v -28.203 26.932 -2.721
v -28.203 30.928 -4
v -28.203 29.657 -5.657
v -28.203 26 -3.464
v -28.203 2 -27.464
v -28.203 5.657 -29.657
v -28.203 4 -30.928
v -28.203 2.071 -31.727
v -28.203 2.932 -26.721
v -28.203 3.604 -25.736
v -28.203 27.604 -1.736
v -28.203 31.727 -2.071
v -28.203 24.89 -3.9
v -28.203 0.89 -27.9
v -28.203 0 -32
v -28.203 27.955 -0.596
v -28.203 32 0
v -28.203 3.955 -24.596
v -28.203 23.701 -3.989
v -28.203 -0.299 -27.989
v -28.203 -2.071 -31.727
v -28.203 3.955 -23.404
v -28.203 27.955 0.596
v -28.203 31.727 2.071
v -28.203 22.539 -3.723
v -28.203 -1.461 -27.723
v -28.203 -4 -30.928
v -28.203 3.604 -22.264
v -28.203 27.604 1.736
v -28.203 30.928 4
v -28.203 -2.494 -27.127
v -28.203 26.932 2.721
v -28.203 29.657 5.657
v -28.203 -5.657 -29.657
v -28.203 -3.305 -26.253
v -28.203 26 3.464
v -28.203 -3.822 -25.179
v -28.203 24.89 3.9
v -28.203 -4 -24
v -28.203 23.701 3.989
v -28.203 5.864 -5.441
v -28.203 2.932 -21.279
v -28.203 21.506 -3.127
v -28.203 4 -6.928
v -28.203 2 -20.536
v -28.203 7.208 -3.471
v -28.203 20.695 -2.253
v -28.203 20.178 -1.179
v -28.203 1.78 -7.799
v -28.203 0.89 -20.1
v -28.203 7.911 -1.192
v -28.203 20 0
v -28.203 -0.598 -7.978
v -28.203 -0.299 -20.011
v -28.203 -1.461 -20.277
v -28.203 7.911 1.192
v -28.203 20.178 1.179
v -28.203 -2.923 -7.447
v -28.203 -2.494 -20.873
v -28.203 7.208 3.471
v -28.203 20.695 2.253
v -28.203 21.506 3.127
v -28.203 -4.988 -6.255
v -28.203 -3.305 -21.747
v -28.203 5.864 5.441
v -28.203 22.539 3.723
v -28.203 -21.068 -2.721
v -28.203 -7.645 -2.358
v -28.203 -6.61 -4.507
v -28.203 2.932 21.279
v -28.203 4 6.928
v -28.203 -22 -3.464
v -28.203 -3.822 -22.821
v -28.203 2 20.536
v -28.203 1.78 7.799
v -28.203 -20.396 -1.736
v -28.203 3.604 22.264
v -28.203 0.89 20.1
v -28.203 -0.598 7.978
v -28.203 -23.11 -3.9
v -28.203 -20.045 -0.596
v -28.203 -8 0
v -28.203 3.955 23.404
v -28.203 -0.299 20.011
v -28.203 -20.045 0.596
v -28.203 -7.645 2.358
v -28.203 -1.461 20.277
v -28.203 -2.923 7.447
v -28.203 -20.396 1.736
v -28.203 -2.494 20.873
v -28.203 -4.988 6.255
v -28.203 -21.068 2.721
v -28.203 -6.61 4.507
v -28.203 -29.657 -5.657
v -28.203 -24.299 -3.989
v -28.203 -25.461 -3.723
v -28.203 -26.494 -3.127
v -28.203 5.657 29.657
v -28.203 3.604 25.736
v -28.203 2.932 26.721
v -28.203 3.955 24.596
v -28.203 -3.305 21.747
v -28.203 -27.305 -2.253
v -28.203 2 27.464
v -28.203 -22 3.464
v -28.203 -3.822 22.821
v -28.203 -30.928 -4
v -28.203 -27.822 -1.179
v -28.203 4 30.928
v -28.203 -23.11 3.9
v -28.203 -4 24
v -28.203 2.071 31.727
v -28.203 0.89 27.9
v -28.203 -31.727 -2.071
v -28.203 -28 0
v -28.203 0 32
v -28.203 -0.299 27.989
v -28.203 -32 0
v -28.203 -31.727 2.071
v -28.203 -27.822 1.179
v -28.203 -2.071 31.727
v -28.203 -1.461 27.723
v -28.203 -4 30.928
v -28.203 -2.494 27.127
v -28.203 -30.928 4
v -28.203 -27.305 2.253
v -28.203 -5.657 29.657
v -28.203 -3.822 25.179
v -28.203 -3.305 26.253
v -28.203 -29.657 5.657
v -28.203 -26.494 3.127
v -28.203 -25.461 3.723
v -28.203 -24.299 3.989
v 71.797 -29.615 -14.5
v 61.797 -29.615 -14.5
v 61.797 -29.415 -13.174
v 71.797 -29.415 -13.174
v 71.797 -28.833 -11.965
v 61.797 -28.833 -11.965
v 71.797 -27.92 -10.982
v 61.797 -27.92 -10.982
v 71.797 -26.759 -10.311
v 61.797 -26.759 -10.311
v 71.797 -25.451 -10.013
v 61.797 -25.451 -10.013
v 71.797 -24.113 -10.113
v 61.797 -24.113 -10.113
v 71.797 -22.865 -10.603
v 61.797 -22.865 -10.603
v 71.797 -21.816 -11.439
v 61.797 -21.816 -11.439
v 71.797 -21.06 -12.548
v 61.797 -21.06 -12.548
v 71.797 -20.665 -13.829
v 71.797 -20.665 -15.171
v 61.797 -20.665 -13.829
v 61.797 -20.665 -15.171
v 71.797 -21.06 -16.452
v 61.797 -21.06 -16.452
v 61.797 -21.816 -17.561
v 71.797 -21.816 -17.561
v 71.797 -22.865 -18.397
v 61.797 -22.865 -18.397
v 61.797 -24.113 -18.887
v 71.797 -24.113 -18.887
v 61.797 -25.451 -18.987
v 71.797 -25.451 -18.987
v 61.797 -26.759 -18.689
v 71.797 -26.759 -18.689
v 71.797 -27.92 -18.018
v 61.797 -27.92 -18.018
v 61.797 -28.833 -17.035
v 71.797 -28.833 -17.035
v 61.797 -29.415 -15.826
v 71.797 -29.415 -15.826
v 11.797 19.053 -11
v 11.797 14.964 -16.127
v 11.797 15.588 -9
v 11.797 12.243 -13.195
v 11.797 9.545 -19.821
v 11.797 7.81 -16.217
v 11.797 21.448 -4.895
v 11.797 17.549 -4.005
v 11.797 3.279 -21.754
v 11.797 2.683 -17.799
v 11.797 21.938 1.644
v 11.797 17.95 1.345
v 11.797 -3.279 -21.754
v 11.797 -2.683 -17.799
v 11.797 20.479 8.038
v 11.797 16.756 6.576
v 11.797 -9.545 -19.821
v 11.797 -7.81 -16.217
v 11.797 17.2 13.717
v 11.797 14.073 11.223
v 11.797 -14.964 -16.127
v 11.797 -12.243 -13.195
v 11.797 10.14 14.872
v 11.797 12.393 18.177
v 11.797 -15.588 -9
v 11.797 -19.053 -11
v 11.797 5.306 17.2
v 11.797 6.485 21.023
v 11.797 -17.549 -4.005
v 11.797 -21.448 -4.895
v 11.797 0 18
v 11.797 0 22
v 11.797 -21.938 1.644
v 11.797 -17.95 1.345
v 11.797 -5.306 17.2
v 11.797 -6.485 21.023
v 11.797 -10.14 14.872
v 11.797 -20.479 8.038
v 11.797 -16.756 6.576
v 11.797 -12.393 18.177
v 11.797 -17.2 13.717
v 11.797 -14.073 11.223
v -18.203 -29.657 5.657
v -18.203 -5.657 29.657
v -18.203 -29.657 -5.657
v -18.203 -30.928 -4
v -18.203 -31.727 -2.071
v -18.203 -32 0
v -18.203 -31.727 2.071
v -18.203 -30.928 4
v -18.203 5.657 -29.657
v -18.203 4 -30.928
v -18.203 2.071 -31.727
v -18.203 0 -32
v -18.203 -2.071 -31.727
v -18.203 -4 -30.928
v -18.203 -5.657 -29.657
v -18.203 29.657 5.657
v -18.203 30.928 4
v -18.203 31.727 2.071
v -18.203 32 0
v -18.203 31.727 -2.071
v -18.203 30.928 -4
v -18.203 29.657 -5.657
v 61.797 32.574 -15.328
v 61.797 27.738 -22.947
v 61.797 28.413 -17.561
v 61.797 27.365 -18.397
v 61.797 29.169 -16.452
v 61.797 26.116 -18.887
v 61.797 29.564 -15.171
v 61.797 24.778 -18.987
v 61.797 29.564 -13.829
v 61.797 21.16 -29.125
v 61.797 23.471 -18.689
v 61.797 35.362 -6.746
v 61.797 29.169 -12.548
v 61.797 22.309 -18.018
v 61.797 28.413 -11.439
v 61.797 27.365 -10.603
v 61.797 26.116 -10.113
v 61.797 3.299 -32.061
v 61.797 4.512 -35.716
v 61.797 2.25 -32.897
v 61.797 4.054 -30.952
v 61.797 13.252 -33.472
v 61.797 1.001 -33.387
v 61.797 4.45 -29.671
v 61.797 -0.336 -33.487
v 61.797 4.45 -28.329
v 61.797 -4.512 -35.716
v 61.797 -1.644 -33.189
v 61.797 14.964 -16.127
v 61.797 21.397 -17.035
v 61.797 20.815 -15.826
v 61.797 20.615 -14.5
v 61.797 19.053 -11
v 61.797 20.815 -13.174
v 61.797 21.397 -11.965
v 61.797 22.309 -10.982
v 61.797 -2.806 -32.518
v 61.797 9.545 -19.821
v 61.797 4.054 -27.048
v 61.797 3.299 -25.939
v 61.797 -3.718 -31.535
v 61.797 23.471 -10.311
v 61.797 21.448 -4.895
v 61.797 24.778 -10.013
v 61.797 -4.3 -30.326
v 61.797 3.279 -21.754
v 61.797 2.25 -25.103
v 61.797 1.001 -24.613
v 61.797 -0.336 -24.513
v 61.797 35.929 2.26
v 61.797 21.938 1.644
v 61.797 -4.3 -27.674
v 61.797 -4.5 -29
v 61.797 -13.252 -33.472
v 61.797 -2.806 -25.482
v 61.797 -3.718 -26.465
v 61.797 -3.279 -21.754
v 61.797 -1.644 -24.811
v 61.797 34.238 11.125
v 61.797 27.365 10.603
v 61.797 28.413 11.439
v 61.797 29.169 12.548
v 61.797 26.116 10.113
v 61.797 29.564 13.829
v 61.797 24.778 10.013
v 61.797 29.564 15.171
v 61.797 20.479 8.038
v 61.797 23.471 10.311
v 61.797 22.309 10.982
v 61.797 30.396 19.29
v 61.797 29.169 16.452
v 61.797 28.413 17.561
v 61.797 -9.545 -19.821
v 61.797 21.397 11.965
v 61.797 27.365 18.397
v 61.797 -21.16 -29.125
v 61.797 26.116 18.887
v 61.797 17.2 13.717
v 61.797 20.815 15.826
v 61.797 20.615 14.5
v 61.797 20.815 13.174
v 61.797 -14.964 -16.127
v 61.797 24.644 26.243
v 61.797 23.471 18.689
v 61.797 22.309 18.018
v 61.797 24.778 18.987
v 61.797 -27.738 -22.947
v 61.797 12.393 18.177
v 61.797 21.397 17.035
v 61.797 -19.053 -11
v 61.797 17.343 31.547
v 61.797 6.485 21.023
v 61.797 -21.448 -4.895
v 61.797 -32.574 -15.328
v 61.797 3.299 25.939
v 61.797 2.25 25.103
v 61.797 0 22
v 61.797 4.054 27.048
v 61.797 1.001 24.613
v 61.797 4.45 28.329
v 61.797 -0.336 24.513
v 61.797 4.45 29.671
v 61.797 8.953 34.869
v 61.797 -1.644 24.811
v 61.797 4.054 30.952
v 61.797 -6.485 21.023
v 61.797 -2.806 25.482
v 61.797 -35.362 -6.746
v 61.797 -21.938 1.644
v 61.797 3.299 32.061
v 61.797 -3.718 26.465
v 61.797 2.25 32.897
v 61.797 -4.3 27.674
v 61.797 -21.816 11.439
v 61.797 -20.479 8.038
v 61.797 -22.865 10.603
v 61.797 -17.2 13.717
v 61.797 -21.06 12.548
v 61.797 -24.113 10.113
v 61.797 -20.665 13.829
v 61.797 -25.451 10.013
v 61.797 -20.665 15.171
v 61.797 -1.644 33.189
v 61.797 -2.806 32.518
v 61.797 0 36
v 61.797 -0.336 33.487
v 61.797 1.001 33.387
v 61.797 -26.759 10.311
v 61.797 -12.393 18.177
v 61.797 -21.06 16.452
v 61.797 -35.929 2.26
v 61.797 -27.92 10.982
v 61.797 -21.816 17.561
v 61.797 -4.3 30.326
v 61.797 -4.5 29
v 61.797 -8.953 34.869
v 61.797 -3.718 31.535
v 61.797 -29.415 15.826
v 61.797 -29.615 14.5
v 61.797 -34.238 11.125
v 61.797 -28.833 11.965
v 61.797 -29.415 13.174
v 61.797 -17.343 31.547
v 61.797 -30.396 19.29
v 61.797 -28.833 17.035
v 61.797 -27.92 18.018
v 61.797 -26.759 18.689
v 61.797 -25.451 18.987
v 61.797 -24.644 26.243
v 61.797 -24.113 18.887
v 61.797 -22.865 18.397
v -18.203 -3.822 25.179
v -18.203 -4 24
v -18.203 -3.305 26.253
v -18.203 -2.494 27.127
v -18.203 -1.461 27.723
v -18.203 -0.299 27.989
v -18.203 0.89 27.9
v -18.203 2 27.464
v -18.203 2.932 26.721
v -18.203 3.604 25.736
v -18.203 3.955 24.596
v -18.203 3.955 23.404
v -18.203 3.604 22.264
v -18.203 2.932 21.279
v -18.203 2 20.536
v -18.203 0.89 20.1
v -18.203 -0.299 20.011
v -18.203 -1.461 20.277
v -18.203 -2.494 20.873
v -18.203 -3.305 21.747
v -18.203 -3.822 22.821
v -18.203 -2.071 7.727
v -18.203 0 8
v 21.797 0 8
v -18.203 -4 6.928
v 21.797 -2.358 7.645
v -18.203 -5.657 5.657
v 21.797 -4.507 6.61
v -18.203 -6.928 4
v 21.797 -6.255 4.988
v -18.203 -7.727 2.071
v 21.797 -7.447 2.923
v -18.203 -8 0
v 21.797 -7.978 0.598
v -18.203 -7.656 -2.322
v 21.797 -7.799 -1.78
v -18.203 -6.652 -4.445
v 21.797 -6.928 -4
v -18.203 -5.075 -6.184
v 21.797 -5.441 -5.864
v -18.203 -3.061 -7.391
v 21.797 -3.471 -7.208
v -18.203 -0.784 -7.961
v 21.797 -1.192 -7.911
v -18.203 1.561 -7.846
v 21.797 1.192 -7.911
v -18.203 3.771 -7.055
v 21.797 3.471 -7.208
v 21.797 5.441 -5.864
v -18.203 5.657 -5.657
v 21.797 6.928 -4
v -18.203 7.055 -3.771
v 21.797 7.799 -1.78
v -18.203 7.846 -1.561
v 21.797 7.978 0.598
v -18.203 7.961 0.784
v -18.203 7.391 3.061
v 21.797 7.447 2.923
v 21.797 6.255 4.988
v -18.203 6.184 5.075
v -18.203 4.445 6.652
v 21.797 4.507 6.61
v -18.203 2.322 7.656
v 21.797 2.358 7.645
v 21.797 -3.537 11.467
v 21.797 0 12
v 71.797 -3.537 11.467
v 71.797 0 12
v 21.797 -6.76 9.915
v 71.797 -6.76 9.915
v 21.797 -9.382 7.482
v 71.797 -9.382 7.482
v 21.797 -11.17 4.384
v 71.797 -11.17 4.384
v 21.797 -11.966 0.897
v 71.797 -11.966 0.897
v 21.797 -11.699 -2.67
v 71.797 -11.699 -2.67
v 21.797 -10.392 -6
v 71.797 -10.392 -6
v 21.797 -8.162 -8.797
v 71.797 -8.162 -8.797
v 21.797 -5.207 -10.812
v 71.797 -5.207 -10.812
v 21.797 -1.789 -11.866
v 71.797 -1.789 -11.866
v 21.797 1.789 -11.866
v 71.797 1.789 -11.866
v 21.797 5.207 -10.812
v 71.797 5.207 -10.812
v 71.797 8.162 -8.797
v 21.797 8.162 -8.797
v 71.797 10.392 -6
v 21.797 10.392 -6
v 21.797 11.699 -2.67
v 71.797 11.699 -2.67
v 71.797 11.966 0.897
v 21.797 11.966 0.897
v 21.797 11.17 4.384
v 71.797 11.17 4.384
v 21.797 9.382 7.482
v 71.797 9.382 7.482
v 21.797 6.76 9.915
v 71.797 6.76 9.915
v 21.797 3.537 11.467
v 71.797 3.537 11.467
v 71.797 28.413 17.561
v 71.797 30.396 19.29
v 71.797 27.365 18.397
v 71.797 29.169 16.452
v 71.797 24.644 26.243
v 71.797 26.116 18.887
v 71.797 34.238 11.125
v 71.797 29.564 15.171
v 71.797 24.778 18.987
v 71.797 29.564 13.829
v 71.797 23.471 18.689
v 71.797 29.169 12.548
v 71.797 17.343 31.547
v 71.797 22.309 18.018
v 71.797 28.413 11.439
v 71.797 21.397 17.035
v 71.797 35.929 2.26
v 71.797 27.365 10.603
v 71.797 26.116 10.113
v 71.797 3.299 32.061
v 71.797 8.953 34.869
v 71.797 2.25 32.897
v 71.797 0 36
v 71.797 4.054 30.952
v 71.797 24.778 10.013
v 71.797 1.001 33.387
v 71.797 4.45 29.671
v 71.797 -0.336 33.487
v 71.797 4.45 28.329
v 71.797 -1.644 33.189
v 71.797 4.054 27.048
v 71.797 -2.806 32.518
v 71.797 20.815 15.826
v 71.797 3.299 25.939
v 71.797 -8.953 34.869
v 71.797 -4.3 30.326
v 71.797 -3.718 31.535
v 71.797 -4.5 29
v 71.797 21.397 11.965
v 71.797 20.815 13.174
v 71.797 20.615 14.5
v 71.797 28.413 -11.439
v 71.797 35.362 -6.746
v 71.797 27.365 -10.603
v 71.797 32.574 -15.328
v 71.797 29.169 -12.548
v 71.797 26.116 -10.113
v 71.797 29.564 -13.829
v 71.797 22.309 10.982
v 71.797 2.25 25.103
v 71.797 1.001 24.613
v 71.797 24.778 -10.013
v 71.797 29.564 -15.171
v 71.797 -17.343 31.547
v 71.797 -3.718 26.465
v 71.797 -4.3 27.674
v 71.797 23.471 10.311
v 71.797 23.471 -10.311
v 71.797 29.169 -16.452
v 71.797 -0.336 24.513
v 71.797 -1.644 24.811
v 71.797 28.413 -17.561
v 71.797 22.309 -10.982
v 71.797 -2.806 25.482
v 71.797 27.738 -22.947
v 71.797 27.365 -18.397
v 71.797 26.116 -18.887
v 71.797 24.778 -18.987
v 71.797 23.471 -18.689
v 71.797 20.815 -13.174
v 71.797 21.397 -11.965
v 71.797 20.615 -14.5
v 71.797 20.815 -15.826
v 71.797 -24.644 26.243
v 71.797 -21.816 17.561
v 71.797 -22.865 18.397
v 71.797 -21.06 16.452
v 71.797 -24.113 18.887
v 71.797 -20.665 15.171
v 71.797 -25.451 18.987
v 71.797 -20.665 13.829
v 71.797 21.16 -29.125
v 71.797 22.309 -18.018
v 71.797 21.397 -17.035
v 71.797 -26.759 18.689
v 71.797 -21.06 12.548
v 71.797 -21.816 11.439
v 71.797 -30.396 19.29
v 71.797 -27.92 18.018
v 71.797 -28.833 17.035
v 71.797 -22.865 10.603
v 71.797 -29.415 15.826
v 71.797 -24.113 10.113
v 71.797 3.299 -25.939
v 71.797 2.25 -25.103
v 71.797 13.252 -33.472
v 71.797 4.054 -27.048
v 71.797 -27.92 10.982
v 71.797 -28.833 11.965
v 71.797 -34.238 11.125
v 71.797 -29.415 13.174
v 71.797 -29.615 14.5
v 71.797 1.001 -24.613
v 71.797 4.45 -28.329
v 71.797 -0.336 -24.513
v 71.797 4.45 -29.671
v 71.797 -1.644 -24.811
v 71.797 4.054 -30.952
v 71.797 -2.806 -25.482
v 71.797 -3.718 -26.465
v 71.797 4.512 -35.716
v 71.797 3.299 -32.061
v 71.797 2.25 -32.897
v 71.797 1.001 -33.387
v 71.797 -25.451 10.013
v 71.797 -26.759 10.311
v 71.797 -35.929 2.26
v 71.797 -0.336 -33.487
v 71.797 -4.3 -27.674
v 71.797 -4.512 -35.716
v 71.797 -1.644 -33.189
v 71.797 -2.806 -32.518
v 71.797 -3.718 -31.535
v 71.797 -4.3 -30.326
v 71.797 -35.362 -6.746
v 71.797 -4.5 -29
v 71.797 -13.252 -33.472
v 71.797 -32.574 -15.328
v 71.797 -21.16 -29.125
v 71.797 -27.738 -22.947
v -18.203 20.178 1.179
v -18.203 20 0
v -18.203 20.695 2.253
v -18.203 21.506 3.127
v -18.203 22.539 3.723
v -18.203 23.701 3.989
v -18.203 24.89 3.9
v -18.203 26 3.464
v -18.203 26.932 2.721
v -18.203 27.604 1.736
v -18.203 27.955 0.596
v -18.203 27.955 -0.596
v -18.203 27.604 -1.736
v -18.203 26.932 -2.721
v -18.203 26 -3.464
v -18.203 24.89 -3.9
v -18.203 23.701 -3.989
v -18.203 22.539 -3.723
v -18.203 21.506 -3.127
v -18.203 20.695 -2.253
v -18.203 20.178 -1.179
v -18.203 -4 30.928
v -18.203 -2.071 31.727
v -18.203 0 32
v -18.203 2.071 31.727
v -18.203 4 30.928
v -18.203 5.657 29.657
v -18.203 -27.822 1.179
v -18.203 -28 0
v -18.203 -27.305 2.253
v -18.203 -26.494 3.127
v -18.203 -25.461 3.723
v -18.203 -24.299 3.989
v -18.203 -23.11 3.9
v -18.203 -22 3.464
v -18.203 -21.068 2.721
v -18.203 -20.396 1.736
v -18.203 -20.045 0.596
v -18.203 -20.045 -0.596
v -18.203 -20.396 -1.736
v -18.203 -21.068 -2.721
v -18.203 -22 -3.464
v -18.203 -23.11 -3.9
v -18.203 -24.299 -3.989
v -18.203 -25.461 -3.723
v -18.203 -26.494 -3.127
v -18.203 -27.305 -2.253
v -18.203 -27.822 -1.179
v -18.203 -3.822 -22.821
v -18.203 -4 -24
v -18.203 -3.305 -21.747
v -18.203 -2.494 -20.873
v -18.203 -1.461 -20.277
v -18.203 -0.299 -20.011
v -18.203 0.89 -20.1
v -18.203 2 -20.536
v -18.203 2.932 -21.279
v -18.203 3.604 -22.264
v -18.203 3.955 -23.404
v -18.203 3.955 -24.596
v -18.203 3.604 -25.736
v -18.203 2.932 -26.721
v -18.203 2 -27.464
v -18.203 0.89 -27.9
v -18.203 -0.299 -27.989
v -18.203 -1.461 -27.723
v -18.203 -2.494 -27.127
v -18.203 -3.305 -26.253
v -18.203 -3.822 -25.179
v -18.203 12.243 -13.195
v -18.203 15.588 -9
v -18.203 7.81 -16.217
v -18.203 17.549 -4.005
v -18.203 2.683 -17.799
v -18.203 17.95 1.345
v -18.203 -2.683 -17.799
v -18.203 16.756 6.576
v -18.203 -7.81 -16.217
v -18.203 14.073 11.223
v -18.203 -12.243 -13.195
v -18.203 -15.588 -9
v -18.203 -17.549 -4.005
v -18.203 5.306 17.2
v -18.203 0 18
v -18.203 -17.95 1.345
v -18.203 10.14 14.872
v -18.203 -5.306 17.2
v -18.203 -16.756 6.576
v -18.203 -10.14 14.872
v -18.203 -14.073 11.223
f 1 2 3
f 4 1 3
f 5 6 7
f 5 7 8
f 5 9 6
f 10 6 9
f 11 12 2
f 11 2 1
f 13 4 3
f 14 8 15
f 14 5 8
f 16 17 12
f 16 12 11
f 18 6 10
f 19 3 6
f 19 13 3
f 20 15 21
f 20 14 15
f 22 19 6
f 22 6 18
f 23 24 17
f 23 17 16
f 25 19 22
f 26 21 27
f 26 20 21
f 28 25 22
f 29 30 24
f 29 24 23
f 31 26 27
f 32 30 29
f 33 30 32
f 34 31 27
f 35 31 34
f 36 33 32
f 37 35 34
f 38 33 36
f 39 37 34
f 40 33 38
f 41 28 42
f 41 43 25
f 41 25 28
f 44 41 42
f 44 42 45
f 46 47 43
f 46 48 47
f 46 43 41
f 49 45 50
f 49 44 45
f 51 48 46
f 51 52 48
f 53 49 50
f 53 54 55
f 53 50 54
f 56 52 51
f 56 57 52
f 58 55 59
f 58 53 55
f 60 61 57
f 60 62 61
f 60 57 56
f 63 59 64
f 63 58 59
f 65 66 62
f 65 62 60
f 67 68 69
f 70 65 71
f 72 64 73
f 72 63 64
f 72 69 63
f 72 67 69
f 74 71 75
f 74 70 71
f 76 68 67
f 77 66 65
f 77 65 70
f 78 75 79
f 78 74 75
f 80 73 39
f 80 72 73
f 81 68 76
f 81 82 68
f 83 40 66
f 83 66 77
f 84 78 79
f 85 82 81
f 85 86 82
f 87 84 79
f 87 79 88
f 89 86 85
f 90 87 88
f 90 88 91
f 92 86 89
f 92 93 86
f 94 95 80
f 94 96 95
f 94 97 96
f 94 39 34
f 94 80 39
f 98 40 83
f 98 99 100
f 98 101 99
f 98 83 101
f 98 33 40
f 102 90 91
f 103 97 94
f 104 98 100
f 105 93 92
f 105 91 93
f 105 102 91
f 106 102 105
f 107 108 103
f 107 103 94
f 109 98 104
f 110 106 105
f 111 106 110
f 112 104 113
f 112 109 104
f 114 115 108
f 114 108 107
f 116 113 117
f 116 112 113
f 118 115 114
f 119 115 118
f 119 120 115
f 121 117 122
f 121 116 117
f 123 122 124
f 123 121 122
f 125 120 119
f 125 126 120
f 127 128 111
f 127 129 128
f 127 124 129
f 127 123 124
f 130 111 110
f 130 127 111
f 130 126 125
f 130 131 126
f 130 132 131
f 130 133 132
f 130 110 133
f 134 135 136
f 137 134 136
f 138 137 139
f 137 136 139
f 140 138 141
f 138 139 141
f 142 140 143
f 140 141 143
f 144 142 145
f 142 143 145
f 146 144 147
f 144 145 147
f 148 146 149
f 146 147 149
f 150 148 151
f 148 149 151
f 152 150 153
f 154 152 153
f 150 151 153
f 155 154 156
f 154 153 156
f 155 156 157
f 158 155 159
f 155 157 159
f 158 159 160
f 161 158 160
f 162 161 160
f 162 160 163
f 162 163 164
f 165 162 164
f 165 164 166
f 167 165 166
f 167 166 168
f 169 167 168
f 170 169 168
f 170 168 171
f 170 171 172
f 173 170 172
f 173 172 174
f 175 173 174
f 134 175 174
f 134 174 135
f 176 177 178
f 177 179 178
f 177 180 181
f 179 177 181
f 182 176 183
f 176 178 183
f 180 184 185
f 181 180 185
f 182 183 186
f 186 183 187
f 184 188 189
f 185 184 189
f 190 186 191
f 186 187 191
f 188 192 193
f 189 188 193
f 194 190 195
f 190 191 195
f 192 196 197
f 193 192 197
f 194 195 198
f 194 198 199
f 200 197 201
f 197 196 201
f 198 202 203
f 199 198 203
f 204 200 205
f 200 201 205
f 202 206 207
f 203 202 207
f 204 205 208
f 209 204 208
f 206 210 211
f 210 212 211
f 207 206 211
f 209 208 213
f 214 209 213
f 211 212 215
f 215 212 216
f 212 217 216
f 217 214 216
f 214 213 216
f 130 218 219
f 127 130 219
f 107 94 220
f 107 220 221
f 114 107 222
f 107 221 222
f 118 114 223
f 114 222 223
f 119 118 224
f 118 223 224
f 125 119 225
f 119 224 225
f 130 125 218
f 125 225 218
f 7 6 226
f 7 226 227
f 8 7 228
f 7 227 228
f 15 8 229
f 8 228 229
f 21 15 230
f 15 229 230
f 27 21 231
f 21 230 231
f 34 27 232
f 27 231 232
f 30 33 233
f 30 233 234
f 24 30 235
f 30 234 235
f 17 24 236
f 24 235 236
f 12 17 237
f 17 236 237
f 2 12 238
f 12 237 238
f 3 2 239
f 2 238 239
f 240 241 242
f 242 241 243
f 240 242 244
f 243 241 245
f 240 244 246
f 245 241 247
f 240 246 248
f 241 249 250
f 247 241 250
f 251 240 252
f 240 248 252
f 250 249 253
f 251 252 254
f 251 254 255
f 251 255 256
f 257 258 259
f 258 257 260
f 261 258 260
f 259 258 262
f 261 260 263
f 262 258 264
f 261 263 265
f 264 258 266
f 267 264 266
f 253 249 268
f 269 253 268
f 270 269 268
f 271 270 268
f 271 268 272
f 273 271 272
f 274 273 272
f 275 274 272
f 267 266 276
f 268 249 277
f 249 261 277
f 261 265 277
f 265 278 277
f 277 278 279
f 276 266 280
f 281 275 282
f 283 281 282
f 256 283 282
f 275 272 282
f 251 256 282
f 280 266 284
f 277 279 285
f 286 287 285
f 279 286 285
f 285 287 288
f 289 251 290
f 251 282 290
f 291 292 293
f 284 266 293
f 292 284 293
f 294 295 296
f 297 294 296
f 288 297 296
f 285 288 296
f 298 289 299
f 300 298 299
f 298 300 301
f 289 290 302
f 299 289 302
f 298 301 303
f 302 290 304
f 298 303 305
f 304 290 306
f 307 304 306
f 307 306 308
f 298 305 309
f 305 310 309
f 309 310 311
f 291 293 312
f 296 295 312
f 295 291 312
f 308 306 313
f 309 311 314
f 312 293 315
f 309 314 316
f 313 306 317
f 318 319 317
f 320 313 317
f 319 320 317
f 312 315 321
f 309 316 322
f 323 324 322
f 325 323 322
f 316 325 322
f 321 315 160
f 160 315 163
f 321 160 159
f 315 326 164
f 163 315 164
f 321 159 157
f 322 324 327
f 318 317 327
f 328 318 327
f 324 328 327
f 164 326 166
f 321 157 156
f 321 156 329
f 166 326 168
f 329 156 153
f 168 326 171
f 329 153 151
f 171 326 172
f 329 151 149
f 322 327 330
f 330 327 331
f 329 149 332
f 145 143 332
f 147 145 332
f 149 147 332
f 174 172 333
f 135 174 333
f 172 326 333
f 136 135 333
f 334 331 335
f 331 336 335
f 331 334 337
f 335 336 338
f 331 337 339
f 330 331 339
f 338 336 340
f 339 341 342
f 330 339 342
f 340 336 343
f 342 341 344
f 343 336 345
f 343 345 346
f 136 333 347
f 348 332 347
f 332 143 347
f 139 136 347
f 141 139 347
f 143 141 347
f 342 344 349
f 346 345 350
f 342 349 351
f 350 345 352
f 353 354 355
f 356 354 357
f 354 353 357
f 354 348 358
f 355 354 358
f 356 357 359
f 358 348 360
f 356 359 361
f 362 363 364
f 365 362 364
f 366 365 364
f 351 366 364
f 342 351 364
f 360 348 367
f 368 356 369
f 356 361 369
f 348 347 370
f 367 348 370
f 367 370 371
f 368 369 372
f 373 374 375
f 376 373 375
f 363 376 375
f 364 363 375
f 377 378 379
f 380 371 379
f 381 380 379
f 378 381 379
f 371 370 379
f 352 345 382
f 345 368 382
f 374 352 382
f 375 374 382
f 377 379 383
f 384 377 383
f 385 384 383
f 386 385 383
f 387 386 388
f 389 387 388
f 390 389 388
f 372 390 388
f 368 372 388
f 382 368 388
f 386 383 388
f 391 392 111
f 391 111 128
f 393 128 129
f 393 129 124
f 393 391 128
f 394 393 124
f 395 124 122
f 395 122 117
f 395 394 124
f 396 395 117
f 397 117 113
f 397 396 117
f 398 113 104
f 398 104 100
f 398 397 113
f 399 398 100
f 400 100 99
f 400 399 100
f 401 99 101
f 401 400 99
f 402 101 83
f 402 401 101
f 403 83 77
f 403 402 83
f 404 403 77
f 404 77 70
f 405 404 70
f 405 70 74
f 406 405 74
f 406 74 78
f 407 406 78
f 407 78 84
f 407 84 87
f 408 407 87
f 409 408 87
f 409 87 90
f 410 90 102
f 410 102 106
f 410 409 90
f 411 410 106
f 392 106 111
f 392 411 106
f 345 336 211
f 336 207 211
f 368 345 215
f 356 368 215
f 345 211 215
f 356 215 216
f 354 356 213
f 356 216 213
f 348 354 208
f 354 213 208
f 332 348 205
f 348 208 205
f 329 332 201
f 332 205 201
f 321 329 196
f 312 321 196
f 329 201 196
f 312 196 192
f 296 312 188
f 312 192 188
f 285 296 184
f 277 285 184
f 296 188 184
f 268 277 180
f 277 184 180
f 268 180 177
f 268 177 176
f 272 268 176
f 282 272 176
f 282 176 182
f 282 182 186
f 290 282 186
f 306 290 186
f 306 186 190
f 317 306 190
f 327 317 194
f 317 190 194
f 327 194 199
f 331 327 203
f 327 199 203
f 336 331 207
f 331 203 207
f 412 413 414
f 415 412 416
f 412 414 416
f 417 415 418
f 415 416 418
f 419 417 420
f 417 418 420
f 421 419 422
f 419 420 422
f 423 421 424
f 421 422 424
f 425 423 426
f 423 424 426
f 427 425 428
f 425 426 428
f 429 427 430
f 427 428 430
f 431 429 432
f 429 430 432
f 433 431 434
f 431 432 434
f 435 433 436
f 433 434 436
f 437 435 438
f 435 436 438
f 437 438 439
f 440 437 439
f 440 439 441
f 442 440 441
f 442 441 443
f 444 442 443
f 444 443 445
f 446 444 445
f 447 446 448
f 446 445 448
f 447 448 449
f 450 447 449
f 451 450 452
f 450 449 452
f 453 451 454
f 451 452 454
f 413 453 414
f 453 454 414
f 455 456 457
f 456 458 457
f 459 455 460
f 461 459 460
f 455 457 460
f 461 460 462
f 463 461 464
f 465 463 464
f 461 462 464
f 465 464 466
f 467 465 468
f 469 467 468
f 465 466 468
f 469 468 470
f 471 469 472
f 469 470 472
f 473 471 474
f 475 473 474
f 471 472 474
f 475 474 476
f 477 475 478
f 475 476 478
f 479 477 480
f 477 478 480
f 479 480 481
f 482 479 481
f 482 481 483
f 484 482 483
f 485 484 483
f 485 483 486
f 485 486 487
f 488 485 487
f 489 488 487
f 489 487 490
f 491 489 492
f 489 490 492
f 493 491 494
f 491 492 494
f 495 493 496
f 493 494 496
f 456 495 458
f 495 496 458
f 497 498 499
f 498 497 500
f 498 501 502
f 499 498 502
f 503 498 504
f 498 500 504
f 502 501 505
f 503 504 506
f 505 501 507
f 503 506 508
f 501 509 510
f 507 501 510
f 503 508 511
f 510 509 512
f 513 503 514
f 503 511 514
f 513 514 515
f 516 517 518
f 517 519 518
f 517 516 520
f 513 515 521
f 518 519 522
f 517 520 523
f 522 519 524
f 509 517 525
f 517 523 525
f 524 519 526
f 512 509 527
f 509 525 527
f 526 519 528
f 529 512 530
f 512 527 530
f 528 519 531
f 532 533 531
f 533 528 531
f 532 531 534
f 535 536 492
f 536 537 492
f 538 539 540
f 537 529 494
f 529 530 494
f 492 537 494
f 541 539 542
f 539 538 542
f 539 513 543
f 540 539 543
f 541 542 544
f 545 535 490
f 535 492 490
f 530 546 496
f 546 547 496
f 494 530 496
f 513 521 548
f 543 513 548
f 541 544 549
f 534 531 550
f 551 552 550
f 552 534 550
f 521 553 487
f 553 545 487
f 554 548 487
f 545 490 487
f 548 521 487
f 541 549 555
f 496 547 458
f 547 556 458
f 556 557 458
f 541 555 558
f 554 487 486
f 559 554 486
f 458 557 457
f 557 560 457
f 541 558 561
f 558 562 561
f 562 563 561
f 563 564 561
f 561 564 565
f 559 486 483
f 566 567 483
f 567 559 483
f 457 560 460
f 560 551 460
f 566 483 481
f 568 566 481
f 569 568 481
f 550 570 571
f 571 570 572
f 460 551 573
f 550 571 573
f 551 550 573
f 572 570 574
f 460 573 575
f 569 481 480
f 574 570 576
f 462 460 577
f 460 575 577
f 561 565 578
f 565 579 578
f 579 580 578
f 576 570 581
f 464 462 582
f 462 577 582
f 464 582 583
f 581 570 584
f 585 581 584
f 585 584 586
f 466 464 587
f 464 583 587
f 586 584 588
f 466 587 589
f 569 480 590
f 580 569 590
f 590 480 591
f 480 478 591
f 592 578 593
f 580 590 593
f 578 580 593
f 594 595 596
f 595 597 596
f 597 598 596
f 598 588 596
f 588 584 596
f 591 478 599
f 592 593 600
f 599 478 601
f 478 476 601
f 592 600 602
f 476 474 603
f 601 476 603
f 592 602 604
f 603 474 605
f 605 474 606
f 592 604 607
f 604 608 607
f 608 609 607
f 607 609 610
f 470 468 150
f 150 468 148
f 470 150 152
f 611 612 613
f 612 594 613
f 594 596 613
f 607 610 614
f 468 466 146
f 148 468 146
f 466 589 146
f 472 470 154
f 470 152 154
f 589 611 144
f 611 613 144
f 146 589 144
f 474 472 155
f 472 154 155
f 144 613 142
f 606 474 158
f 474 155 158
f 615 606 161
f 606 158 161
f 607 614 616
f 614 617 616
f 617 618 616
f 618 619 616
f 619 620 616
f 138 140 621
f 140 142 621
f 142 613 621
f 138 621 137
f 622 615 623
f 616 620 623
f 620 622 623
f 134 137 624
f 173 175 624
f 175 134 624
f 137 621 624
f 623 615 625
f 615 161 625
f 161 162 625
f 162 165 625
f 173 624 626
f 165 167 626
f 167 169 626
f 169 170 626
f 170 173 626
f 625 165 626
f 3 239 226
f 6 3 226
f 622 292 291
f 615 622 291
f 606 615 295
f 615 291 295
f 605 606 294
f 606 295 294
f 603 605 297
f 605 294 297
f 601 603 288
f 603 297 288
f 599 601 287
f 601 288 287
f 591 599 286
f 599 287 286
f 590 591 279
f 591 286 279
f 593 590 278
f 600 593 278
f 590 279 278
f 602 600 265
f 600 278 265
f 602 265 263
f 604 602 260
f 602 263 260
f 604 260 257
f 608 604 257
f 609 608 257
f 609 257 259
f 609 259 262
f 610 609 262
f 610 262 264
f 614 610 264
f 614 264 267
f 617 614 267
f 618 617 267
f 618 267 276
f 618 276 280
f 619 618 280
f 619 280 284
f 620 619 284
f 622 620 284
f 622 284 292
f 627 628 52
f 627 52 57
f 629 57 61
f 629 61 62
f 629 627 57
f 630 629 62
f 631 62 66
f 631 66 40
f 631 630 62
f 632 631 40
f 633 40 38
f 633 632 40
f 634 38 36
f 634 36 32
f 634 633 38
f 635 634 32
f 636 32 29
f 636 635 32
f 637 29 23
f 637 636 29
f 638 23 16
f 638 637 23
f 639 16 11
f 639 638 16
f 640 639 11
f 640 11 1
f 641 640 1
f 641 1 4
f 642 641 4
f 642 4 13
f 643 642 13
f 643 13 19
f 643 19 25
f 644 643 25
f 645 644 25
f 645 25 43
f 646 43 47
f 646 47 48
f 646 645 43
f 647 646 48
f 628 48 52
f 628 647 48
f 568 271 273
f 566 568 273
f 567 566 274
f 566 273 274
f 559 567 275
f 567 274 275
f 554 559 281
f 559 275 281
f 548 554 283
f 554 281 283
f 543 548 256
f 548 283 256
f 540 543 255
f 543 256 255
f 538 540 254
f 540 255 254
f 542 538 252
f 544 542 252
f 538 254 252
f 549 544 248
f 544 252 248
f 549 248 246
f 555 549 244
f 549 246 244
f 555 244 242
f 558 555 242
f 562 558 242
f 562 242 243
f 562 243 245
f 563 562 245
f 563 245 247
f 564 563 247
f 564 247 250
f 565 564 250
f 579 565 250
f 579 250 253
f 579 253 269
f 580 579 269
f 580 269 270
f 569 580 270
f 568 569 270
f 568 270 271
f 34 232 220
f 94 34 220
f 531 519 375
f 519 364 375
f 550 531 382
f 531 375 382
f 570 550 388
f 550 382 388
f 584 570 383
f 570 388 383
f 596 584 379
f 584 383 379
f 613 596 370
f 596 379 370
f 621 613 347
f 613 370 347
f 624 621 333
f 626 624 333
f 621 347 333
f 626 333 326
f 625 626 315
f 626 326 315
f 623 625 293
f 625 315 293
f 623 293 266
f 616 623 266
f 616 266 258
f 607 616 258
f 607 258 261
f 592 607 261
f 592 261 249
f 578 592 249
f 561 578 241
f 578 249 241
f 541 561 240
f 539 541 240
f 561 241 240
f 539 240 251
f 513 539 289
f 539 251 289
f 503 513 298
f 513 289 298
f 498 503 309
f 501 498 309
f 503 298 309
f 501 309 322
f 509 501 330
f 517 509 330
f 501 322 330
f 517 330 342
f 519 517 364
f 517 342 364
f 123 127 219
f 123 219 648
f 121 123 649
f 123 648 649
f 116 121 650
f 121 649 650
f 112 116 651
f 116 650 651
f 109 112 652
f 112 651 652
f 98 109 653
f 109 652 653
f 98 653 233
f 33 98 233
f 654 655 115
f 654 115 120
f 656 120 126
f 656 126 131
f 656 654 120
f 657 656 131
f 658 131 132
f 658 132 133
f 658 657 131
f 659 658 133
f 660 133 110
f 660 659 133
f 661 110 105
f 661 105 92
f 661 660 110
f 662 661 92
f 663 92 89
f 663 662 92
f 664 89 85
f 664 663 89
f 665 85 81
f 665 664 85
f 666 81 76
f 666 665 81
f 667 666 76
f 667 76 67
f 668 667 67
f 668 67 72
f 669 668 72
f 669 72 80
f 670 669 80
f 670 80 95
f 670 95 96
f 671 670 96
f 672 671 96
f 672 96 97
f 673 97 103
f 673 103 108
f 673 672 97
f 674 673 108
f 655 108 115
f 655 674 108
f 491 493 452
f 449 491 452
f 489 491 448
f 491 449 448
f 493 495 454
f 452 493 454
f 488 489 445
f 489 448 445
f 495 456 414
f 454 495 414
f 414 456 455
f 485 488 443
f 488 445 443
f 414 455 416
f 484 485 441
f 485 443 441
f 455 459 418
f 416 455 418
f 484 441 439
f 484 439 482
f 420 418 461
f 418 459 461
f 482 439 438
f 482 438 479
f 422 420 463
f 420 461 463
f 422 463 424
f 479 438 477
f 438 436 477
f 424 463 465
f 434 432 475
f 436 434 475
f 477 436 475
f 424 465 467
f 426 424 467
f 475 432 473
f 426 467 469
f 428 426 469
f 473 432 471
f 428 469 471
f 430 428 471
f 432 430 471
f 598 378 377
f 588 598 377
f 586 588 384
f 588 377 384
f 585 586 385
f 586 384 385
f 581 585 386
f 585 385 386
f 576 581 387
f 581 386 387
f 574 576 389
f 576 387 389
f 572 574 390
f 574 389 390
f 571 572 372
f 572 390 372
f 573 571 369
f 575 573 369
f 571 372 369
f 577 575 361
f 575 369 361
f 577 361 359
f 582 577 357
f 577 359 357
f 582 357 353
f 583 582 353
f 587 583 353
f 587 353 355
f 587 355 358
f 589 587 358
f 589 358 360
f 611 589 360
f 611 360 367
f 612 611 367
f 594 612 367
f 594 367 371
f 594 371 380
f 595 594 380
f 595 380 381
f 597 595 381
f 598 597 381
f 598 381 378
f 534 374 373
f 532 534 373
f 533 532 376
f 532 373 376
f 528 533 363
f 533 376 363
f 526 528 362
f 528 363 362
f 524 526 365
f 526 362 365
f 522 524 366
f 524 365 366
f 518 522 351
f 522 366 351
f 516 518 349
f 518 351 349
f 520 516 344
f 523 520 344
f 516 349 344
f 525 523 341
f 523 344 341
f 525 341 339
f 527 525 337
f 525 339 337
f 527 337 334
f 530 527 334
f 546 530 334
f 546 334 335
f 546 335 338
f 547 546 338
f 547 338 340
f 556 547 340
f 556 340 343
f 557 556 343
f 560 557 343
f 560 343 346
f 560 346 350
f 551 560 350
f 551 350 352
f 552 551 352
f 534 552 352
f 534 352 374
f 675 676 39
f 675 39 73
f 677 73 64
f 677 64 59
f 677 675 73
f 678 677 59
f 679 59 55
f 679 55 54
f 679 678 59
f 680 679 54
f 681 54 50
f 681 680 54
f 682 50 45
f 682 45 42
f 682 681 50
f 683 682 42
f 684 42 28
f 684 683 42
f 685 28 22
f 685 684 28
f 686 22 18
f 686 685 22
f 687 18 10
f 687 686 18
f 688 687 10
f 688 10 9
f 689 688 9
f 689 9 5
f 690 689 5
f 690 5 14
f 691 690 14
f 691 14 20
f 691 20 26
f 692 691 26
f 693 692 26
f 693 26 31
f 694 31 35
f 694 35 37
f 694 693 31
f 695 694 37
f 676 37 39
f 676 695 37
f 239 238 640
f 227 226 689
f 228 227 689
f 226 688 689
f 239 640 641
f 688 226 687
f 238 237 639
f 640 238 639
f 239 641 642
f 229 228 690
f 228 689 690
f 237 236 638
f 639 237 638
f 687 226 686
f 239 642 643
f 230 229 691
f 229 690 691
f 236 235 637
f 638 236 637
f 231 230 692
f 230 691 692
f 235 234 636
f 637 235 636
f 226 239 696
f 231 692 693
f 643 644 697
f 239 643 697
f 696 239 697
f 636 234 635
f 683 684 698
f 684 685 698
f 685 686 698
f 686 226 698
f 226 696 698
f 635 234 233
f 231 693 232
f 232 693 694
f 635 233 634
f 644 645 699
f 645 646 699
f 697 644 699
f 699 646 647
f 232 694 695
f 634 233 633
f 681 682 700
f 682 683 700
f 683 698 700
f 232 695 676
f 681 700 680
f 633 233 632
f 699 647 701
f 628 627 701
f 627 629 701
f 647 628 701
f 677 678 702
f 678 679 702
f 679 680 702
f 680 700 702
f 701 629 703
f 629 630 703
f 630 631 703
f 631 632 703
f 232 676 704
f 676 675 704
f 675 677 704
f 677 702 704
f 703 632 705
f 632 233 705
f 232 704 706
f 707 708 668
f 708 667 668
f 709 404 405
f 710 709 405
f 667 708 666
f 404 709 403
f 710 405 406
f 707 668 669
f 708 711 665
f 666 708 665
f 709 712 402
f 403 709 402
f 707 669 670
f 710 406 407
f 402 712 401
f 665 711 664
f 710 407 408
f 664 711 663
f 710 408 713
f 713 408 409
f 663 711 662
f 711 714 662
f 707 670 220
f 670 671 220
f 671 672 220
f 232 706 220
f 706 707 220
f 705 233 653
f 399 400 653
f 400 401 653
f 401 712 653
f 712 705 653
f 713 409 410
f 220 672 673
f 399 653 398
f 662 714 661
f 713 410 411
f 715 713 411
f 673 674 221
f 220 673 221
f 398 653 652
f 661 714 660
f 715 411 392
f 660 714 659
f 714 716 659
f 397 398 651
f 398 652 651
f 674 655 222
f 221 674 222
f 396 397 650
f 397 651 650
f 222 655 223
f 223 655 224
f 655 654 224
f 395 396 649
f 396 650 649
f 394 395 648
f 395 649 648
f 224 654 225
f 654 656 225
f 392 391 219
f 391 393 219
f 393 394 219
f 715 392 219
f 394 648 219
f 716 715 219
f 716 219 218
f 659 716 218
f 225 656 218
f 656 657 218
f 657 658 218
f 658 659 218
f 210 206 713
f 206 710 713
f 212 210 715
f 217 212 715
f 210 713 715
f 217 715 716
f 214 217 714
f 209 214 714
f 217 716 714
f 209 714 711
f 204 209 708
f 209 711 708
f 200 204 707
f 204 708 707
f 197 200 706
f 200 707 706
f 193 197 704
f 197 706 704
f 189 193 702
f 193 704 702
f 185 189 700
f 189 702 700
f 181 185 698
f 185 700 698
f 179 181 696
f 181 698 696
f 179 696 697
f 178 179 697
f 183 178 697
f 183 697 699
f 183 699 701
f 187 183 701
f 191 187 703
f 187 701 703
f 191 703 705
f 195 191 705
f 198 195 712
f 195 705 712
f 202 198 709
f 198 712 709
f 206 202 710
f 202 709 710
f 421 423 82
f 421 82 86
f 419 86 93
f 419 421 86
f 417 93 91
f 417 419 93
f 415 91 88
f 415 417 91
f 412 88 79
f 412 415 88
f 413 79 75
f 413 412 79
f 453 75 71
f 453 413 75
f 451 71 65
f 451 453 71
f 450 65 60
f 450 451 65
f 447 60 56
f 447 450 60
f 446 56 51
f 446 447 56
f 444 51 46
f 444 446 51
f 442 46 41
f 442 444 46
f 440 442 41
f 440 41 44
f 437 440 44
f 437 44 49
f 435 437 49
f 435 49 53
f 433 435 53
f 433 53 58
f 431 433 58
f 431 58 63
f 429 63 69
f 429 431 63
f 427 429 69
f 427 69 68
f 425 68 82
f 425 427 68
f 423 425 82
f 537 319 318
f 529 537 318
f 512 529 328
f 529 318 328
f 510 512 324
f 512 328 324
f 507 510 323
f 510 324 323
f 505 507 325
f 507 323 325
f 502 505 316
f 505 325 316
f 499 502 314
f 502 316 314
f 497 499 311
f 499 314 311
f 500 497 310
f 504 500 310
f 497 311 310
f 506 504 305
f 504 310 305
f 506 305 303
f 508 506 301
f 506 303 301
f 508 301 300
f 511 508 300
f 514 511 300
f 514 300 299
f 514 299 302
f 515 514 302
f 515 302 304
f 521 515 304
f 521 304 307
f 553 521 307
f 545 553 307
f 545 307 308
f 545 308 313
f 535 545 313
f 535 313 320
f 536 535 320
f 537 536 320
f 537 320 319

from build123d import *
from build123d import SkipClean  # not in build123d's __all__

# Parameters (mm, degrees)
F2_R     = 4.5
F3_DEPTH = 10.001
F4_R     = 4
F4_R_2   = 18
F4_R_3   = 8
F5_DEPTH = 10


with BuildPart() as f1:
    # F0 (on Front) → F1 (revolve)
    with BuildSketch(Plane.XZ):
        Polygon((-18.203094868, 18), (-18.203094868, 8), (21.796905132, 8), (21.796905132, 12), (71.796905132, 12), (71.796905132, 36), (61.796905132, 36), (61.796905132, 22), (11.796905132, 22), (11.796905132, 18), align=None)
    revolve(axis=Axis((24.6733184904, 0, 0), (1, 0, 0)))

    # F2 (on face) → F3 (cut, through all)
    with BuildSketch(Plane(origin=(61.796905132, 0, 0), x_dir=(0, -1, 0), z_dir=(-1, 0, 0))):
        with Locations((0, 29)):
            Circle(F2_R)
        with Locations((-25.1147367097, 14.5)):
            Circle(F2_R)
        with Locations((-25.1147367097, -14.5)):
            Circle(F2_R)
        with Locations((0, -29)):
            Circle(F2_R)
        with Locations((25.1147367097, -14.5)):
            Circle(F2_R)
        with Locations((25.1147367097, 14.5)):
            Circle(F2_R)
    extrude(amount=-F3_DEPTH, mode=Mode.SUBTRACT)

    # F4 (on face) → F5 (join)
    with BuildSketch(Plane(origin=(-18.203094868, 0, 0), x_dir=(0, -1, 0), z_dir=(-1, 0, 0))):
        with BuildLine():
            ThreePointArc((5.6568542495, 29.6568542495), (0, 32), (-5.6568542495, 29.6568542495))
            Line((-5.6568542495, 29.6568542495), (-29.6568542495, 5.6568542495))
            ThreePointArc((-29.6568542495, 5.6568542495), (-32, 0), (-29.6568542495, -5.6568542495))
            Line((-29.6568542495, -5.6568542495), (-5.6568542495, -29.6568542495))
            ThreePointArc((-5.6568542495, -29.6568542495), (0, -32), (5.6568542495, -29.6568542495))
            Line((5.6568542495, -29.6568542495), (29.6568542495, -5.6568542495))
            ThreePointArc((29.6568542495, -5.6568542495), (32, 0), (29.6568542495, 5.6568542495))
            Line((29.6568542495, 5.6568542495), (5.6568542495, 29.6568542495))
        make_face()
        with Locations((0, -24)):
            Circle(F4_R, mode=Mode.SUBTRACT)
        with Locations((-24, 0)):
            Circle(F4_R, mode=Mode.SUBTRACT)
        Circle(F4_R_2, mode=Mode.SUBTRACT)
        with Locations((24, 0)):
            Circle(F4_R, mode=Mode.SUBTRACT)
        with Locations((0, 24)):
            Circle(F4_R, mode=Mode.SUBTRACT)
        Circle(F4_R_2)
        Circle(F4_R_3, mode=Mode.SUBTRACT)
    with SkipClean():  # cleaning this boolean's faces spoils the solid; the shape is the same uncleaned
        extrude(amount=F5_DEPTH)


solid = f1.part
